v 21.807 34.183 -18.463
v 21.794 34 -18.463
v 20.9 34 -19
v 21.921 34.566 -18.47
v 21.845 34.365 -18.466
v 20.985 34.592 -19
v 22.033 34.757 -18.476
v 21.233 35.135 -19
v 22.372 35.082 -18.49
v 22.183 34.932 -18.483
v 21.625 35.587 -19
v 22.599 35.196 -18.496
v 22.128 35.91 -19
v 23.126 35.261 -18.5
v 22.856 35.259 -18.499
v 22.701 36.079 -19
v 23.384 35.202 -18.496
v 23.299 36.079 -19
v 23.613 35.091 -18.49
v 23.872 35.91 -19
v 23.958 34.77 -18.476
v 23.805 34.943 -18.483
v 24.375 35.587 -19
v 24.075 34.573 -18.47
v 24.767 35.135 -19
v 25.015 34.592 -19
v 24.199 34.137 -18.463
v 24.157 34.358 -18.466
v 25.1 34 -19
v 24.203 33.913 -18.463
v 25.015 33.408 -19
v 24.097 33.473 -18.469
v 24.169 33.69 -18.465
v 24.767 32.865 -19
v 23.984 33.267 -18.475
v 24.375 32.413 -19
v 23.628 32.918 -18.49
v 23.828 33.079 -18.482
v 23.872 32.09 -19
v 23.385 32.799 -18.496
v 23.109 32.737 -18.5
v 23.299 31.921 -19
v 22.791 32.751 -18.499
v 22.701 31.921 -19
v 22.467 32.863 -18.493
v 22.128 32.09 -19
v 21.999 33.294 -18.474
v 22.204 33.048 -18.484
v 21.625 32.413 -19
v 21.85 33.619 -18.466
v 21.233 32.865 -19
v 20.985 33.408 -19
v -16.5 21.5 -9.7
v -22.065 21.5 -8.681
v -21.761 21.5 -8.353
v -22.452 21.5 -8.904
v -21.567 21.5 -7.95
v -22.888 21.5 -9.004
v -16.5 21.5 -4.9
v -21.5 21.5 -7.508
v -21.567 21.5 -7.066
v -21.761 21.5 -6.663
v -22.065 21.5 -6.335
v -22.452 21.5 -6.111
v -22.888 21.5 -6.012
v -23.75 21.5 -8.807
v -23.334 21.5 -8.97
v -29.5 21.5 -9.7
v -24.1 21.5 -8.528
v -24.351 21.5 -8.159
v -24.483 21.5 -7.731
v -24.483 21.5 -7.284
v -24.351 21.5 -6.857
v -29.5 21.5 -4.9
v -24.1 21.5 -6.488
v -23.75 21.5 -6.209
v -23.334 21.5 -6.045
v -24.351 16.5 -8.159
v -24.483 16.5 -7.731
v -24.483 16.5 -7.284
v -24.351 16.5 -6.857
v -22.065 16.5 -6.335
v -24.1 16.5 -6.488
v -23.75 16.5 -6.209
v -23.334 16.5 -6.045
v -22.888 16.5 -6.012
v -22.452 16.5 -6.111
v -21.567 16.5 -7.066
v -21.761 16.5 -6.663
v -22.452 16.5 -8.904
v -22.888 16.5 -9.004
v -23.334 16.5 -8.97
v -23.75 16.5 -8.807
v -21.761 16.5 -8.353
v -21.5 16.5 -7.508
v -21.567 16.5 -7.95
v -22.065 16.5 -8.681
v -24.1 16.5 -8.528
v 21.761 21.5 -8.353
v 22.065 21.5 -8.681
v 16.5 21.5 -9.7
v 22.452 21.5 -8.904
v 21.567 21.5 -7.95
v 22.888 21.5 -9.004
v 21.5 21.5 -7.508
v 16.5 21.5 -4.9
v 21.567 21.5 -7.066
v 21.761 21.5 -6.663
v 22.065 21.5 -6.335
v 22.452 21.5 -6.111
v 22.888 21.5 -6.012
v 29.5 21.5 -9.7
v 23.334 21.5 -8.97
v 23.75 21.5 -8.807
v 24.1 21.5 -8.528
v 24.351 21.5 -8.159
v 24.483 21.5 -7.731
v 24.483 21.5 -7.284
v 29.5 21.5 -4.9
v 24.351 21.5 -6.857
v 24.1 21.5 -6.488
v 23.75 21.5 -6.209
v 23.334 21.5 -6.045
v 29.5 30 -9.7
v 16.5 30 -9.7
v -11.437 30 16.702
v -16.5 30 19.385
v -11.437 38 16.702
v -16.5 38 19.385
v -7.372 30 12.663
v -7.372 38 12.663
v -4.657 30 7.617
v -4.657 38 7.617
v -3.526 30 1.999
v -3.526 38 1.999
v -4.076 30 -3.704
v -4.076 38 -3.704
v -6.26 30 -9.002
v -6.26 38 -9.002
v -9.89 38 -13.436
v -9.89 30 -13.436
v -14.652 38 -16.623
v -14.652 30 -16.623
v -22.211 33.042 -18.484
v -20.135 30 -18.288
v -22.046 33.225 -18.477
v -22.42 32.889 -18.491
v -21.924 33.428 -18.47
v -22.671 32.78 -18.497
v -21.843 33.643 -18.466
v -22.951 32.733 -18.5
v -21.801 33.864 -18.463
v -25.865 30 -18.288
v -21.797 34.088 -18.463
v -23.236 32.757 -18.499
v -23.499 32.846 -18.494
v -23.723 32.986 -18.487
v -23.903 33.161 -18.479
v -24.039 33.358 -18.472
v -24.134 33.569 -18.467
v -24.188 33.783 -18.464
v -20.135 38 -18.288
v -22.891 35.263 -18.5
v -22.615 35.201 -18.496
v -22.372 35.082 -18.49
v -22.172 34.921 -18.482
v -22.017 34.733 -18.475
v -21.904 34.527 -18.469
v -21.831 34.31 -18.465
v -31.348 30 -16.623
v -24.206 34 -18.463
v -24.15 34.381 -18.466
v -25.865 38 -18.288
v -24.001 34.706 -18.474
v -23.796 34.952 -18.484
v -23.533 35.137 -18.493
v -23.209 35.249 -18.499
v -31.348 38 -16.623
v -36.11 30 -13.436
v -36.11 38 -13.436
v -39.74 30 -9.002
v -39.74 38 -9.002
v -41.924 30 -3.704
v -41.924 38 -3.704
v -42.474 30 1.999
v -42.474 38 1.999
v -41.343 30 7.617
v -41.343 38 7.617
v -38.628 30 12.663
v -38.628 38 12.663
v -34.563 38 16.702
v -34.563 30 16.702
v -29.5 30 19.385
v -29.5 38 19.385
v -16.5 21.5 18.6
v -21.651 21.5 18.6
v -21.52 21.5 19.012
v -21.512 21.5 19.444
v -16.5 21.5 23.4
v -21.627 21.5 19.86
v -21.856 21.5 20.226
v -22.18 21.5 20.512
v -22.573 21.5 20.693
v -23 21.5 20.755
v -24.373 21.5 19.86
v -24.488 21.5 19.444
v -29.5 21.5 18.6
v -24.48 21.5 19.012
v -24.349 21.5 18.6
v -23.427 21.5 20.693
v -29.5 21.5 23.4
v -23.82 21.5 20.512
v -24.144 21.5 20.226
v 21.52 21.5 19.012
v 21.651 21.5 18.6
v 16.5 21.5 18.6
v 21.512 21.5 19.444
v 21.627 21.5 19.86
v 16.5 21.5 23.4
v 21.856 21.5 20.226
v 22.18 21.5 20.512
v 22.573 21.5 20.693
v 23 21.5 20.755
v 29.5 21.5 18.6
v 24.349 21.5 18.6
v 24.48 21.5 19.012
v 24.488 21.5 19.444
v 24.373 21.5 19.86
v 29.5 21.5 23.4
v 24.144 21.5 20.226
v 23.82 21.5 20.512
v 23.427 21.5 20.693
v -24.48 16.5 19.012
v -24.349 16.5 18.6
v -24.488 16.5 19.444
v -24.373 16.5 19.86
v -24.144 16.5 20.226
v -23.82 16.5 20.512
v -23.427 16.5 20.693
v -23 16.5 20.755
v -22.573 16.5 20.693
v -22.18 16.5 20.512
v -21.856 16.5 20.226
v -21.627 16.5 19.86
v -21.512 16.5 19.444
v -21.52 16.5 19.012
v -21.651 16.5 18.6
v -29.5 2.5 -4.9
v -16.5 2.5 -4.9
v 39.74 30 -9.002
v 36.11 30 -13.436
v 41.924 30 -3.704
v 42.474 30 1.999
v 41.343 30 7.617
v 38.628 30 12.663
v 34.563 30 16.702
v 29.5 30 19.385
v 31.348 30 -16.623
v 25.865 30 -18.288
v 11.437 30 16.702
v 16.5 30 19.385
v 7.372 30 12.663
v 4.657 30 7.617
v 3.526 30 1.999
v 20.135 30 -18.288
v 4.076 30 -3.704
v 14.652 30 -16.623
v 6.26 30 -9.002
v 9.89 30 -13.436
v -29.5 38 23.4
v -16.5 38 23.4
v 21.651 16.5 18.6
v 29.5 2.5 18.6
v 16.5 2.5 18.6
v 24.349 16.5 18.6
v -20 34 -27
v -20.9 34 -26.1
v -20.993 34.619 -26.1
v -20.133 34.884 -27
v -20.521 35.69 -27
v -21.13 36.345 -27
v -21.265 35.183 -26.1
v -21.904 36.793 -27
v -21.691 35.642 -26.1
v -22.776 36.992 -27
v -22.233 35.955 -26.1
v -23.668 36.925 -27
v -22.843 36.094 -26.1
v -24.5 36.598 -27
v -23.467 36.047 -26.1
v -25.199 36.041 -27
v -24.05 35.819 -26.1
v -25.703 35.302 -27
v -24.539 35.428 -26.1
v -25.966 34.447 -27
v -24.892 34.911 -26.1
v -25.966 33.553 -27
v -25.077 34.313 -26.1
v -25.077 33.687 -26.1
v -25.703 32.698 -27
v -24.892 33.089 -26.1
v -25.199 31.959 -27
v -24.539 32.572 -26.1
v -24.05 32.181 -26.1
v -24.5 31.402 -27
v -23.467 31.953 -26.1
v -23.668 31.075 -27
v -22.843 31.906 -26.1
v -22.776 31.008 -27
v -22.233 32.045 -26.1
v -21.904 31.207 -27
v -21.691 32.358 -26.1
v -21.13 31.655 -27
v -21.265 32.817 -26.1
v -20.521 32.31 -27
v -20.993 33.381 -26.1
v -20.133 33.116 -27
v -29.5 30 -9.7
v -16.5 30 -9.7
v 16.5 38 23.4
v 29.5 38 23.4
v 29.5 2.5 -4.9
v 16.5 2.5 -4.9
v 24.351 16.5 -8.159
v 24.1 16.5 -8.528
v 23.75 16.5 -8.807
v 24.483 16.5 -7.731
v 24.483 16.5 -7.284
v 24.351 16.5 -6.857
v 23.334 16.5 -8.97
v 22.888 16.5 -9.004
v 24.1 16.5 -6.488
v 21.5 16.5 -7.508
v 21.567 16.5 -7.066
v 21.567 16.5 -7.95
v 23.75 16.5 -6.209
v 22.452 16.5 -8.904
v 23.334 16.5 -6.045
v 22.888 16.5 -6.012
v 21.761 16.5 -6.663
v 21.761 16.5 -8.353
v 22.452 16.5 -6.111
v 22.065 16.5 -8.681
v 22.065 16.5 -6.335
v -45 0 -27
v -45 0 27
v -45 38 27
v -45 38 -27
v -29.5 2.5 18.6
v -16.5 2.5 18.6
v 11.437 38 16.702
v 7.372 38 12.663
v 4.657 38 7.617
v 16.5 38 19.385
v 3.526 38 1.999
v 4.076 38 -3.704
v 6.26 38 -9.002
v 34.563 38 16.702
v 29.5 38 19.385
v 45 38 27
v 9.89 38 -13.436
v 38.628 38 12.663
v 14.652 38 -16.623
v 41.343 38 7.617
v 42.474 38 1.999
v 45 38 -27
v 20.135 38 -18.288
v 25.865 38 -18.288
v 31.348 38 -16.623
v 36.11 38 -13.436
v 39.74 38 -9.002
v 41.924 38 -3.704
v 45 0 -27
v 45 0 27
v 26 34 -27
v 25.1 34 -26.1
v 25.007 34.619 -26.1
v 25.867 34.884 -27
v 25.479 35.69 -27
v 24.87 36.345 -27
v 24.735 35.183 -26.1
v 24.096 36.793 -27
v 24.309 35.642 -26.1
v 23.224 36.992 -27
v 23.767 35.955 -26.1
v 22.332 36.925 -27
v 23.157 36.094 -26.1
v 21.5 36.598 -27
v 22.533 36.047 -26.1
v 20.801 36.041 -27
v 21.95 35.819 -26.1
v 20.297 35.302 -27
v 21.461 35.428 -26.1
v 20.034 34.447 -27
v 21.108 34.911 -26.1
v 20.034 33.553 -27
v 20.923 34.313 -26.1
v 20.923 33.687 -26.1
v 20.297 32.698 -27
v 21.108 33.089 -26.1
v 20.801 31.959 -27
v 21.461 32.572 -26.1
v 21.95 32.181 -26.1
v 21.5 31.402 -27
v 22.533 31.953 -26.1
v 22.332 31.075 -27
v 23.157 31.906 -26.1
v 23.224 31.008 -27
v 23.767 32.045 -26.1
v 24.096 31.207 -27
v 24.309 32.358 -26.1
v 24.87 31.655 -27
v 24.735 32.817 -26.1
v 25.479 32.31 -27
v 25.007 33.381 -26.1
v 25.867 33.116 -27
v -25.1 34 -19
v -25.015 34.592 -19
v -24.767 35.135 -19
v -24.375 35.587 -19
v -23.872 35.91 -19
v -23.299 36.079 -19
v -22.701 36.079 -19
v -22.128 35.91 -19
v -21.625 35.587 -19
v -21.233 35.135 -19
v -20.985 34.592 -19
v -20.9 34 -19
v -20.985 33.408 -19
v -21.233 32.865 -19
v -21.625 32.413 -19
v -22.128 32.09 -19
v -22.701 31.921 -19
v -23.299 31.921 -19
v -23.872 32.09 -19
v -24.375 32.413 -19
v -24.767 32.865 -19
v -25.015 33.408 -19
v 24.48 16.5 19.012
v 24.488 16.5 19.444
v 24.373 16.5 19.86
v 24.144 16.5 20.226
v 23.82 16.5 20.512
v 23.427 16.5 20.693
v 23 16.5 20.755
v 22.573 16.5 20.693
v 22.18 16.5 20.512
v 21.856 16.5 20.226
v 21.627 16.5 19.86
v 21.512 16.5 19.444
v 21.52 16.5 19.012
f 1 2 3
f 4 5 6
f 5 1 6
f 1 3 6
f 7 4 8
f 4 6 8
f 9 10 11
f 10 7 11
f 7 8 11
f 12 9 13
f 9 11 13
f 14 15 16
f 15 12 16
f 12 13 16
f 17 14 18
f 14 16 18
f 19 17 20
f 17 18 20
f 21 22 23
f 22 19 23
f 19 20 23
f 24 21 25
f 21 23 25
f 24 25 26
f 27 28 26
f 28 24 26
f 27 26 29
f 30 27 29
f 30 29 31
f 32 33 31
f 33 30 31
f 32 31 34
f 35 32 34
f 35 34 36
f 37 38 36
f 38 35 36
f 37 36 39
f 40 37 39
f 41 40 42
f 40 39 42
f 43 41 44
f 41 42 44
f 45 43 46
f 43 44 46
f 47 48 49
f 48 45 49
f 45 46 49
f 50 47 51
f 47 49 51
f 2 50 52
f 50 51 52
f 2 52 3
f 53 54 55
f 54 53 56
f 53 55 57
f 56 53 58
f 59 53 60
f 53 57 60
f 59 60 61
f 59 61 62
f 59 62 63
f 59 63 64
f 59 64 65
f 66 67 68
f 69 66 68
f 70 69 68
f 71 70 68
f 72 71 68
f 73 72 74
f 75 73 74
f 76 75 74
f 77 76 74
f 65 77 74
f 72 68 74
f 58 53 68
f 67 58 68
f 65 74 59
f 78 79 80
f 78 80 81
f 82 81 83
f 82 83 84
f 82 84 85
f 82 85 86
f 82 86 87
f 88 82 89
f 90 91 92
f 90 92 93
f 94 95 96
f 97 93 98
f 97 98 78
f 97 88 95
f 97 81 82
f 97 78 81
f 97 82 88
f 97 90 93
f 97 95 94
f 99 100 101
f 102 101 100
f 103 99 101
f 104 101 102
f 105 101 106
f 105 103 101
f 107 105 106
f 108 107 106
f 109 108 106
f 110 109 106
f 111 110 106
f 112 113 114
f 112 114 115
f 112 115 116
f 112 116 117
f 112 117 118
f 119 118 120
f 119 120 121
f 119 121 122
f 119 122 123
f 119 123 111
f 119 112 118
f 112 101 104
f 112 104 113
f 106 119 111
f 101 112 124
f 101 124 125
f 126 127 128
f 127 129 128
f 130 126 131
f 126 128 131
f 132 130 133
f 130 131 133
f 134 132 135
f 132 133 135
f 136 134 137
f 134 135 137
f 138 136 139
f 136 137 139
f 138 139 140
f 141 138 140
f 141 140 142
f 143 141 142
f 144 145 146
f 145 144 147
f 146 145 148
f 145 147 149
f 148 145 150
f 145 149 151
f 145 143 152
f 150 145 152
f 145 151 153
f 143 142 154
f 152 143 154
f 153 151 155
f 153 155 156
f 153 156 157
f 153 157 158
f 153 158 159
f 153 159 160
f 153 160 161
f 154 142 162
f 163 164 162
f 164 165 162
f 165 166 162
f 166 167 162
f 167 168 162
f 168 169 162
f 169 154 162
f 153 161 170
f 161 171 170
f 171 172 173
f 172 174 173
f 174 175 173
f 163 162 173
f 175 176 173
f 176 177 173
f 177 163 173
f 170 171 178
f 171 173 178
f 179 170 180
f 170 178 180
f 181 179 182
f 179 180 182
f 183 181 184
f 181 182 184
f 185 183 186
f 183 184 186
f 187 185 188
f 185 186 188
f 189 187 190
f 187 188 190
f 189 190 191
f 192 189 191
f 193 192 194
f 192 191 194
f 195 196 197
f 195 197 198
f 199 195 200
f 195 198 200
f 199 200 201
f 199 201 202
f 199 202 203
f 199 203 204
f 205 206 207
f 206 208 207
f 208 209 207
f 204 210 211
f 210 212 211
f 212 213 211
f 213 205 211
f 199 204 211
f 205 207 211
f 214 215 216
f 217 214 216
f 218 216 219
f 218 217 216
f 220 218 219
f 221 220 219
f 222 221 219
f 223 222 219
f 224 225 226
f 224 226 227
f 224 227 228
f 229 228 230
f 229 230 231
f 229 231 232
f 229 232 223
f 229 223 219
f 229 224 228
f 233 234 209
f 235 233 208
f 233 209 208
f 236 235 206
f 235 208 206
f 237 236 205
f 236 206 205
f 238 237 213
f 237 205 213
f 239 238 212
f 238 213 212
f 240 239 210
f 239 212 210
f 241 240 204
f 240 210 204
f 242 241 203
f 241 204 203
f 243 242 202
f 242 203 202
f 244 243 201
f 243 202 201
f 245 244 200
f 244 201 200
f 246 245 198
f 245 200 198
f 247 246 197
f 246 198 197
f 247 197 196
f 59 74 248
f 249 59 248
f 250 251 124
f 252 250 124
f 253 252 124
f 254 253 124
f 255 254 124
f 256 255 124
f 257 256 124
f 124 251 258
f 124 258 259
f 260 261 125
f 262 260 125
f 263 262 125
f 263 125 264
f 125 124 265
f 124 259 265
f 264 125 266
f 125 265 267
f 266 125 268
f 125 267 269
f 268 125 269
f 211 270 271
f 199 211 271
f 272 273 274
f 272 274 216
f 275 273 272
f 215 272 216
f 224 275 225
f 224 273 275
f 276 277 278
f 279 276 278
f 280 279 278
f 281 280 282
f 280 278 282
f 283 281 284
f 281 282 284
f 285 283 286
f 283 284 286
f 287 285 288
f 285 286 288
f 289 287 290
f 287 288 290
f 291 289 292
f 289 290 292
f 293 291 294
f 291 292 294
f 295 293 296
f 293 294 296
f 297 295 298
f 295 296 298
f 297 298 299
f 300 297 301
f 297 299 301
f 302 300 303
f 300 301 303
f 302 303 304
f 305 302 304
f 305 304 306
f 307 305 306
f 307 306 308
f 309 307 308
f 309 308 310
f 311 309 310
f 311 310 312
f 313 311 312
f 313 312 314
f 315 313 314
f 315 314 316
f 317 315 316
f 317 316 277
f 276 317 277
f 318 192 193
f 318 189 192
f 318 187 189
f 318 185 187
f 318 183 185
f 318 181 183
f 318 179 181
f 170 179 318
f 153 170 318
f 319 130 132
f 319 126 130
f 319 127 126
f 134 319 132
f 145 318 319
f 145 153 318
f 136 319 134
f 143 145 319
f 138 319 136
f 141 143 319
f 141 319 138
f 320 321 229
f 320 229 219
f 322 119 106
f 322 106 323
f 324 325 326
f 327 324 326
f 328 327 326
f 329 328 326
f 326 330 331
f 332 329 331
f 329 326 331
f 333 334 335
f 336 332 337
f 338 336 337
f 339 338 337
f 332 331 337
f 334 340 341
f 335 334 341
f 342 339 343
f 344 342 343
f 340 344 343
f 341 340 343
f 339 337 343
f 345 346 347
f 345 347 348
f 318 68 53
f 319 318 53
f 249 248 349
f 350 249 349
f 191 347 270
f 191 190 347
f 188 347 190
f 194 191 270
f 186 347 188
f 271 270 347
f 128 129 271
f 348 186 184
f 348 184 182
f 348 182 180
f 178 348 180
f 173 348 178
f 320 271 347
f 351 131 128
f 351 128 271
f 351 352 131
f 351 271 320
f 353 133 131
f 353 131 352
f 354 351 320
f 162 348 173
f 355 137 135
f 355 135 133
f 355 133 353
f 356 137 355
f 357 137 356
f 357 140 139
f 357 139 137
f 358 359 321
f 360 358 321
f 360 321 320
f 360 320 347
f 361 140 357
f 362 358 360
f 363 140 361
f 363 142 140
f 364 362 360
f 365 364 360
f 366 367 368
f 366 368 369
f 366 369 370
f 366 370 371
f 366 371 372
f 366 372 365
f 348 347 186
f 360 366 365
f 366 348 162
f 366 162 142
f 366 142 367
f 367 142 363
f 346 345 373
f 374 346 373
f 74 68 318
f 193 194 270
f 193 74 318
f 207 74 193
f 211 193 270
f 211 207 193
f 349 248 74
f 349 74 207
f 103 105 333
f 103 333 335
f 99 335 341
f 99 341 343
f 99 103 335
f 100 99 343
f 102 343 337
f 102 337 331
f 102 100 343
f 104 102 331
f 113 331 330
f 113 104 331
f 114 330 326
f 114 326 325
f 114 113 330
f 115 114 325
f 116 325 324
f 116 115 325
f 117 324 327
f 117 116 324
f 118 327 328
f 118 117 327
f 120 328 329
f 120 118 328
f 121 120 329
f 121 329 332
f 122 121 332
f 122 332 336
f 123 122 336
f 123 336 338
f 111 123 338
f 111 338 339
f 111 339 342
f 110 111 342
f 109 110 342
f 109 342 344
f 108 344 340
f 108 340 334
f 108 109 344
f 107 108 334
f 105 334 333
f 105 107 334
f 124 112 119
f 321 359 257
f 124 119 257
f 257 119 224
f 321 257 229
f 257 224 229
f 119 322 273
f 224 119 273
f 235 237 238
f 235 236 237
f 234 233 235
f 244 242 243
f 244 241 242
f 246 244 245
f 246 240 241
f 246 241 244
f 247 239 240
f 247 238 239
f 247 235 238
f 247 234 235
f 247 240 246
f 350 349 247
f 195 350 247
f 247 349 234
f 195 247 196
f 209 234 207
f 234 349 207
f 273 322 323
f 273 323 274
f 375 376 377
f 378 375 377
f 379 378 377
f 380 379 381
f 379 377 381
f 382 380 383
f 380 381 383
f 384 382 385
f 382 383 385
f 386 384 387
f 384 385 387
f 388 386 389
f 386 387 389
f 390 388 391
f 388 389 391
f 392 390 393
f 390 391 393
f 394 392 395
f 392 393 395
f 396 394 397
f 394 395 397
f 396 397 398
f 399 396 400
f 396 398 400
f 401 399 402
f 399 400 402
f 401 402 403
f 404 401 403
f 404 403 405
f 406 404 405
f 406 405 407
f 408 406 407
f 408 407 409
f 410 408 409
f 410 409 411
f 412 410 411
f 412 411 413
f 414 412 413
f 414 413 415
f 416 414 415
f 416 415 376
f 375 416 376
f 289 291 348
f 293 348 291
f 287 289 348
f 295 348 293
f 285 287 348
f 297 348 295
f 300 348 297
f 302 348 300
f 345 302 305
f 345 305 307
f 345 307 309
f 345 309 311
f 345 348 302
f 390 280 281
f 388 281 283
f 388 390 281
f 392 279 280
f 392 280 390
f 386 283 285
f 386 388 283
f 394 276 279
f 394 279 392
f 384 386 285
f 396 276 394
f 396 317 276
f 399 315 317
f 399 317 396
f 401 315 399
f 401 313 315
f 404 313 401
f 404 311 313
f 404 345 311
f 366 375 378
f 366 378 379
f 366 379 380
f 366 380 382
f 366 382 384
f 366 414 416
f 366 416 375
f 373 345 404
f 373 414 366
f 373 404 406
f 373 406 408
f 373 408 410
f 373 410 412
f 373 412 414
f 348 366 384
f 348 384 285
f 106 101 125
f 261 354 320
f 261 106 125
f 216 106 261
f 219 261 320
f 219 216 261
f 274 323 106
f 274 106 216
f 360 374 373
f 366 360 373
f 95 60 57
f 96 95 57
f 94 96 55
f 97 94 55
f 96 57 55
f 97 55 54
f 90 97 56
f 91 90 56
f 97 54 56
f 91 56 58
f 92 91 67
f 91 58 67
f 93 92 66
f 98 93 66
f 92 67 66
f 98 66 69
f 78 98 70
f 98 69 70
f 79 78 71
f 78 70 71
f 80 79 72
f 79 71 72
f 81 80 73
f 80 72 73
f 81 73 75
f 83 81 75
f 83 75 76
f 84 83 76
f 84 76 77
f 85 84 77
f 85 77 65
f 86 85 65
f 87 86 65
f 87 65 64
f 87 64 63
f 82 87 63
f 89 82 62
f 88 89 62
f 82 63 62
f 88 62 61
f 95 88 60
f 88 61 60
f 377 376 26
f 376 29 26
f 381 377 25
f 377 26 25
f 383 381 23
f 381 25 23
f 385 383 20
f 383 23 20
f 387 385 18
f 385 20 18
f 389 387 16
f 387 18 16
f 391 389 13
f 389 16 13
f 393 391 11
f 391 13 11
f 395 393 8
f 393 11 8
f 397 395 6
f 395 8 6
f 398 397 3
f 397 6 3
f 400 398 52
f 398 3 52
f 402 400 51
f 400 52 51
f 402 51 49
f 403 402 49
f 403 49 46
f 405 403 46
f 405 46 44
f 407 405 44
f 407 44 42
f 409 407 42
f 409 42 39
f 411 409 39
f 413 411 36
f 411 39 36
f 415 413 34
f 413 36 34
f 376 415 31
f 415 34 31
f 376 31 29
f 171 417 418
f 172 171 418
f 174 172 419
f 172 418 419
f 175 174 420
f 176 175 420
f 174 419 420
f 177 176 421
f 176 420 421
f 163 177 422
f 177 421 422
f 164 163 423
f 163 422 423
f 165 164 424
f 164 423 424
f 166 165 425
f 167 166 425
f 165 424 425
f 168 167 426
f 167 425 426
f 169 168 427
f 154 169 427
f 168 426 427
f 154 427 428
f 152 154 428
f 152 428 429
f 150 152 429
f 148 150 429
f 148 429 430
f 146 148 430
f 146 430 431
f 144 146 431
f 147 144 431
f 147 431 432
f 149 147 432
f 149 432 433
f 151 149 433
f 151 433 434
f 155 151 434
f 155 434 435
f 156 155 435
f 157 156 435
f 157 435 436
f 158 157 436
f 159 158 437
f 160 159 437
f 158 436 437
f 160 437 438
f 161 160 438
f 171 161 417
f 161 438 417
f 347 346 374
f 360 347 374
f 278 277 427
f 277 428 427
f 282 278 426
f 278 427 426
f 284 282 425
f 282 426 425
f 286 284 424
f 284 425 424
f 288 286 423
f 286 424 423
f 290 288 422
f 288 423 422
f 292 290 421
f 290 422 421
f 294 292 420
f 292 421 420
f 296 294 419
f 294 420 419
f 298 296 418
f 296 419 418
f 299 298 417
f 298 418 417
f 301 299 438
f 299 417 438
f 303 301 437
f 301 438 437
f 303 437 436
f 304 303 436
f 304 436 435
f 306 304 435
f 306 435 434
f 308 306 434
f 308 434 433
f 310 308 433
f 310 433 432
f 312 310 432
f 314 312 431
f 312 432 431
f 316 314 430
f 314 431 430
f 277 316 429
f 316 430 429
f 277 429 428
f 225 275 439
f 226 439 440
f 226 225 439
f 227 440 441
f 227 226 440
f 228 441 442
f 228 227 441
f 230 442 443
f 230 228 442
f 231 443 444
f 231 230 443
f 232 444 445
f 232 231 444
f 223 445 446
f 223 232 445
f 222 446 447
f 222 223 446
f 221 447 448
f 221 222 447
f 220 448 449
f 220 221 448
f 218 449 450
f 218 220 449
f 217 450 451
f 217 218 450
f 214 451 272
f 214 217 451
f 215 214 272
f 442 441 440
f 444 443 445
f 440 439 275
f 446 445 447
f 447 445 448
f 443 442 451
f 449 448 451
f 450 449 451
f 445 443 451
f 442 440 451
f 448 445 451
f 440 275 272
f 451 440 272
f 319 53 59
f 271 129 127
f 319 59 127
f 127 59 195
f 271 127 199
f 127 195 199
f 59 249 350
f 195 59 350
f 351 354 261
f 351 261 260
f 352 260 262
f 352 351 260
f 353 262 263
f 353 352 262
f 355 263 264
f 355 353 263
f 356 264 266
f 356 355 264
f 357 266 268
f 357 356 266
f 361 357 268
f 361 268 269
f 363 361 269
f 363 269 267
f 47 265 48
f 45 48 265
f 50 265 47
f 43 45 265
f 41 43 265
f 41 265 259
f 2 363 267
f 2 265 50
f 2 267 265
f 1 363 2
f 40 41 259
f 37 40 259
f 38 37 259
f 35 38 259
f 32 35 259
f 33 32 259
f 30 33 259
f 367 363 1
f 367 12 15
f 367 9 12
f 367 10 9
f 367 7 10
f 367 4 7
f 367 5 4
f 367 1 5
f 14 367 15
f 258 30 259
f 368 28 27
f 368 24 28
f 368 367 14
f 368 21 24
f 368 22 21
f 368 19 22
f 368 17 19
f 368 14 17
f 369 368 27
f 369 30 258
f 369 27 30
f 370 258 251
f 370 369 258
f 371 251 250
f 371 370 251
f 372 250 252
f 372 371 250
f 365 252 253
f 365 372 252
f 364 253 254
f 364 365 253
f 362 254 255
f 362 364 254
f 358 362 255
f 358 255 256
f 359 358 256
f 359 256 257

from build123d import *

# Parameters (mm, degrees)
SKETCH1_W                       = 90
SKETCH1_H                       = 54
BOSS_EXTRUDE1_DEPTH             = 38
CUT_EXTRUDE1_START              = -15.5
CUT_EXTRUDE1_DEPTH              = 13
SKETCH4_W                       = 13
SKETCH4_H                       = 4.8
CUT_EXTRUDE2_DEPTH              = 14
SKETCH3_R                       = 19.5
CUT_EXTRUDE3_DEPTH              = 8
SKETCH7_R                       = 1.5
CUT_EXTRUDE4_DEPTH              = 5
M5X0_8_TAPPED_HOLE1_D           = 4.2
M5X0_8_TAPPED_HOLE1_DEPTH       = 8
M5X0_8_TAPPED_HOLE1_CSINK_D     = 6
M5X0_8_TAPPED_HOLE1_CSINK_ANGLE = 90
M5X0_8_TAPPED_HOLE1_TIP         = 1.2618073


with BuildPart() as part:
    # Sketch1 → Boss-Extrude1 (new body)
    with BuildSketch(Plane(origin=(0, 0, 0), x_dir=(1, 0, 0), z_dir=(0, 1, 0))):
        Rectangle(SKETCH1_W, SKETCH1_H)
    extrude(amount=BOSS_EXTRUDE1_DEPTH)

    # Sketch2 → Cut-Extrude1 (cut)
    with BuildSketch(Plane.ZY.offset(45).offset(CUT_EXTRUDE1_START)):
        Polygon((-4.9, 2.5), (18.6, 2.5), (18.6, 21.5), (23.4, 21.5), (23.4, 24), (18.6, 24), (18.6, 37.402398481), (-4.9, 37.402398481), (-4.9, 24), (-9.7, 24), (-9.7, 21.5), (-4.9, 21.5), align=None)
    cut_extrude1 = extrude(amount=-CUT_EXTRUDE1_DEPTH, mode=Mode.SUBTRACT)

    # Sketch4 → Cut-Extrude2 (cut)
    with BuildSketch(Plane.XZ.offset(-24)):
        with Locations((-23, 21)):
            Rectangle(SKETCH4_W, SKETCH4_H)
        with Locations((-23, -7.3)):
            Rectangle(SKETCH4_W, SKETCH4_H)
    cut_extrude2 = extrude(amount=-CUT_EXTRUDE2_DEPTH, mode=Mode.SUBTRACT)

    # Sketch3 → Cut-Extrude3 (cut)
    with BuildSketch(Plane(origin=(0, 38, 0), x_dir=(1, 0, 0), z_dir=(0, 1, 0))):
        with Locations((-23, -1)):
            Circle(SKETCH3_R)
    cut_extrude3 = extrude(amount=-CUT_EXTRUDE3_DEPTH, mode=Mode.SUBTRACT)

    # Sketch7 → Cut-Extrude4 (cut)
    with BuildSketch(Plane(origin=(0, 21.5, 0), x_dir=(1, 0, 0), z_dir=(0, 1, 0))):
        with Locations((-23, 7.507766872)):
            Circle(SKETCH7_R)
        with Locations((-23, -19.255354552)):
            Circle(SKETCH7_R)
    cut_extrude4 = extrude(amount=-CUT_EXTRUDE4_DEPTH, mode=Mode.SUBTRACT)

    # Mirror1: Cut-Extrude1, Cut-Extrude2, Cut-Extrude3, Cut-Extrude4 across plane
    add(cut_extrude1.mirror(Plane(origin=(0, 0, 0), x_dir=(0, 0, 1), z_dir=(1, 0, 0))), mode=Mode.SUBTRACT)
    add(cut_extrude2.mirror(Plane(origin=(0, 0, 0), x_dir=(0, 0, 1), z_dir=(1, 0, 0))), mode=Mode.SUBTRACT)
    add(cut_extrude3.mirror(Plane(origin=(0, 0, 0), x_dir=(0, 0, 1), z_dir=(1, 0, 0))), mode=Mode.SUBTRACT)
    add(cut_extrude4.mirror(Plane(origin=(0, 0, 0), x_dir=(0, 0, 1), z_dir=(1, 0, 0))), mode=Mode.SUBTRACT)

    # M5x0.8 Tapped Hole1
    with Locations(Plane(origin=(23, 34, -27), x_dir=(-1, 0, 0), z_dir=(0, 0, -1))):
        with Locations((0, 0), (46, 0)):
            CounterSinkHole(M5X0_8_TAPPED_HOLE1_D / 2, M5X0_8_TAPPED_HOLE1_CSINK_D / 2, depth=M5X0_8_TAPPED_HOLE1_DEPTH, counter_sink_angle=M5X0_8_TAPPED_HOLE1_CSINK_ANGLE)
            with Locations((0, 0, -(M5X0_8_TAPPED_HOLE1_DEPTH + M5X0_8_TAPPED_HOLE1_TIP / 2))):  # 118° drill point
                Cone(0, M5X0_8_TAPPED_HOLE1_D / 2, M5X0_8_TAPPED_HOLE1_TIP, mode=Mode.SUBTRACT)


solid = part.part
